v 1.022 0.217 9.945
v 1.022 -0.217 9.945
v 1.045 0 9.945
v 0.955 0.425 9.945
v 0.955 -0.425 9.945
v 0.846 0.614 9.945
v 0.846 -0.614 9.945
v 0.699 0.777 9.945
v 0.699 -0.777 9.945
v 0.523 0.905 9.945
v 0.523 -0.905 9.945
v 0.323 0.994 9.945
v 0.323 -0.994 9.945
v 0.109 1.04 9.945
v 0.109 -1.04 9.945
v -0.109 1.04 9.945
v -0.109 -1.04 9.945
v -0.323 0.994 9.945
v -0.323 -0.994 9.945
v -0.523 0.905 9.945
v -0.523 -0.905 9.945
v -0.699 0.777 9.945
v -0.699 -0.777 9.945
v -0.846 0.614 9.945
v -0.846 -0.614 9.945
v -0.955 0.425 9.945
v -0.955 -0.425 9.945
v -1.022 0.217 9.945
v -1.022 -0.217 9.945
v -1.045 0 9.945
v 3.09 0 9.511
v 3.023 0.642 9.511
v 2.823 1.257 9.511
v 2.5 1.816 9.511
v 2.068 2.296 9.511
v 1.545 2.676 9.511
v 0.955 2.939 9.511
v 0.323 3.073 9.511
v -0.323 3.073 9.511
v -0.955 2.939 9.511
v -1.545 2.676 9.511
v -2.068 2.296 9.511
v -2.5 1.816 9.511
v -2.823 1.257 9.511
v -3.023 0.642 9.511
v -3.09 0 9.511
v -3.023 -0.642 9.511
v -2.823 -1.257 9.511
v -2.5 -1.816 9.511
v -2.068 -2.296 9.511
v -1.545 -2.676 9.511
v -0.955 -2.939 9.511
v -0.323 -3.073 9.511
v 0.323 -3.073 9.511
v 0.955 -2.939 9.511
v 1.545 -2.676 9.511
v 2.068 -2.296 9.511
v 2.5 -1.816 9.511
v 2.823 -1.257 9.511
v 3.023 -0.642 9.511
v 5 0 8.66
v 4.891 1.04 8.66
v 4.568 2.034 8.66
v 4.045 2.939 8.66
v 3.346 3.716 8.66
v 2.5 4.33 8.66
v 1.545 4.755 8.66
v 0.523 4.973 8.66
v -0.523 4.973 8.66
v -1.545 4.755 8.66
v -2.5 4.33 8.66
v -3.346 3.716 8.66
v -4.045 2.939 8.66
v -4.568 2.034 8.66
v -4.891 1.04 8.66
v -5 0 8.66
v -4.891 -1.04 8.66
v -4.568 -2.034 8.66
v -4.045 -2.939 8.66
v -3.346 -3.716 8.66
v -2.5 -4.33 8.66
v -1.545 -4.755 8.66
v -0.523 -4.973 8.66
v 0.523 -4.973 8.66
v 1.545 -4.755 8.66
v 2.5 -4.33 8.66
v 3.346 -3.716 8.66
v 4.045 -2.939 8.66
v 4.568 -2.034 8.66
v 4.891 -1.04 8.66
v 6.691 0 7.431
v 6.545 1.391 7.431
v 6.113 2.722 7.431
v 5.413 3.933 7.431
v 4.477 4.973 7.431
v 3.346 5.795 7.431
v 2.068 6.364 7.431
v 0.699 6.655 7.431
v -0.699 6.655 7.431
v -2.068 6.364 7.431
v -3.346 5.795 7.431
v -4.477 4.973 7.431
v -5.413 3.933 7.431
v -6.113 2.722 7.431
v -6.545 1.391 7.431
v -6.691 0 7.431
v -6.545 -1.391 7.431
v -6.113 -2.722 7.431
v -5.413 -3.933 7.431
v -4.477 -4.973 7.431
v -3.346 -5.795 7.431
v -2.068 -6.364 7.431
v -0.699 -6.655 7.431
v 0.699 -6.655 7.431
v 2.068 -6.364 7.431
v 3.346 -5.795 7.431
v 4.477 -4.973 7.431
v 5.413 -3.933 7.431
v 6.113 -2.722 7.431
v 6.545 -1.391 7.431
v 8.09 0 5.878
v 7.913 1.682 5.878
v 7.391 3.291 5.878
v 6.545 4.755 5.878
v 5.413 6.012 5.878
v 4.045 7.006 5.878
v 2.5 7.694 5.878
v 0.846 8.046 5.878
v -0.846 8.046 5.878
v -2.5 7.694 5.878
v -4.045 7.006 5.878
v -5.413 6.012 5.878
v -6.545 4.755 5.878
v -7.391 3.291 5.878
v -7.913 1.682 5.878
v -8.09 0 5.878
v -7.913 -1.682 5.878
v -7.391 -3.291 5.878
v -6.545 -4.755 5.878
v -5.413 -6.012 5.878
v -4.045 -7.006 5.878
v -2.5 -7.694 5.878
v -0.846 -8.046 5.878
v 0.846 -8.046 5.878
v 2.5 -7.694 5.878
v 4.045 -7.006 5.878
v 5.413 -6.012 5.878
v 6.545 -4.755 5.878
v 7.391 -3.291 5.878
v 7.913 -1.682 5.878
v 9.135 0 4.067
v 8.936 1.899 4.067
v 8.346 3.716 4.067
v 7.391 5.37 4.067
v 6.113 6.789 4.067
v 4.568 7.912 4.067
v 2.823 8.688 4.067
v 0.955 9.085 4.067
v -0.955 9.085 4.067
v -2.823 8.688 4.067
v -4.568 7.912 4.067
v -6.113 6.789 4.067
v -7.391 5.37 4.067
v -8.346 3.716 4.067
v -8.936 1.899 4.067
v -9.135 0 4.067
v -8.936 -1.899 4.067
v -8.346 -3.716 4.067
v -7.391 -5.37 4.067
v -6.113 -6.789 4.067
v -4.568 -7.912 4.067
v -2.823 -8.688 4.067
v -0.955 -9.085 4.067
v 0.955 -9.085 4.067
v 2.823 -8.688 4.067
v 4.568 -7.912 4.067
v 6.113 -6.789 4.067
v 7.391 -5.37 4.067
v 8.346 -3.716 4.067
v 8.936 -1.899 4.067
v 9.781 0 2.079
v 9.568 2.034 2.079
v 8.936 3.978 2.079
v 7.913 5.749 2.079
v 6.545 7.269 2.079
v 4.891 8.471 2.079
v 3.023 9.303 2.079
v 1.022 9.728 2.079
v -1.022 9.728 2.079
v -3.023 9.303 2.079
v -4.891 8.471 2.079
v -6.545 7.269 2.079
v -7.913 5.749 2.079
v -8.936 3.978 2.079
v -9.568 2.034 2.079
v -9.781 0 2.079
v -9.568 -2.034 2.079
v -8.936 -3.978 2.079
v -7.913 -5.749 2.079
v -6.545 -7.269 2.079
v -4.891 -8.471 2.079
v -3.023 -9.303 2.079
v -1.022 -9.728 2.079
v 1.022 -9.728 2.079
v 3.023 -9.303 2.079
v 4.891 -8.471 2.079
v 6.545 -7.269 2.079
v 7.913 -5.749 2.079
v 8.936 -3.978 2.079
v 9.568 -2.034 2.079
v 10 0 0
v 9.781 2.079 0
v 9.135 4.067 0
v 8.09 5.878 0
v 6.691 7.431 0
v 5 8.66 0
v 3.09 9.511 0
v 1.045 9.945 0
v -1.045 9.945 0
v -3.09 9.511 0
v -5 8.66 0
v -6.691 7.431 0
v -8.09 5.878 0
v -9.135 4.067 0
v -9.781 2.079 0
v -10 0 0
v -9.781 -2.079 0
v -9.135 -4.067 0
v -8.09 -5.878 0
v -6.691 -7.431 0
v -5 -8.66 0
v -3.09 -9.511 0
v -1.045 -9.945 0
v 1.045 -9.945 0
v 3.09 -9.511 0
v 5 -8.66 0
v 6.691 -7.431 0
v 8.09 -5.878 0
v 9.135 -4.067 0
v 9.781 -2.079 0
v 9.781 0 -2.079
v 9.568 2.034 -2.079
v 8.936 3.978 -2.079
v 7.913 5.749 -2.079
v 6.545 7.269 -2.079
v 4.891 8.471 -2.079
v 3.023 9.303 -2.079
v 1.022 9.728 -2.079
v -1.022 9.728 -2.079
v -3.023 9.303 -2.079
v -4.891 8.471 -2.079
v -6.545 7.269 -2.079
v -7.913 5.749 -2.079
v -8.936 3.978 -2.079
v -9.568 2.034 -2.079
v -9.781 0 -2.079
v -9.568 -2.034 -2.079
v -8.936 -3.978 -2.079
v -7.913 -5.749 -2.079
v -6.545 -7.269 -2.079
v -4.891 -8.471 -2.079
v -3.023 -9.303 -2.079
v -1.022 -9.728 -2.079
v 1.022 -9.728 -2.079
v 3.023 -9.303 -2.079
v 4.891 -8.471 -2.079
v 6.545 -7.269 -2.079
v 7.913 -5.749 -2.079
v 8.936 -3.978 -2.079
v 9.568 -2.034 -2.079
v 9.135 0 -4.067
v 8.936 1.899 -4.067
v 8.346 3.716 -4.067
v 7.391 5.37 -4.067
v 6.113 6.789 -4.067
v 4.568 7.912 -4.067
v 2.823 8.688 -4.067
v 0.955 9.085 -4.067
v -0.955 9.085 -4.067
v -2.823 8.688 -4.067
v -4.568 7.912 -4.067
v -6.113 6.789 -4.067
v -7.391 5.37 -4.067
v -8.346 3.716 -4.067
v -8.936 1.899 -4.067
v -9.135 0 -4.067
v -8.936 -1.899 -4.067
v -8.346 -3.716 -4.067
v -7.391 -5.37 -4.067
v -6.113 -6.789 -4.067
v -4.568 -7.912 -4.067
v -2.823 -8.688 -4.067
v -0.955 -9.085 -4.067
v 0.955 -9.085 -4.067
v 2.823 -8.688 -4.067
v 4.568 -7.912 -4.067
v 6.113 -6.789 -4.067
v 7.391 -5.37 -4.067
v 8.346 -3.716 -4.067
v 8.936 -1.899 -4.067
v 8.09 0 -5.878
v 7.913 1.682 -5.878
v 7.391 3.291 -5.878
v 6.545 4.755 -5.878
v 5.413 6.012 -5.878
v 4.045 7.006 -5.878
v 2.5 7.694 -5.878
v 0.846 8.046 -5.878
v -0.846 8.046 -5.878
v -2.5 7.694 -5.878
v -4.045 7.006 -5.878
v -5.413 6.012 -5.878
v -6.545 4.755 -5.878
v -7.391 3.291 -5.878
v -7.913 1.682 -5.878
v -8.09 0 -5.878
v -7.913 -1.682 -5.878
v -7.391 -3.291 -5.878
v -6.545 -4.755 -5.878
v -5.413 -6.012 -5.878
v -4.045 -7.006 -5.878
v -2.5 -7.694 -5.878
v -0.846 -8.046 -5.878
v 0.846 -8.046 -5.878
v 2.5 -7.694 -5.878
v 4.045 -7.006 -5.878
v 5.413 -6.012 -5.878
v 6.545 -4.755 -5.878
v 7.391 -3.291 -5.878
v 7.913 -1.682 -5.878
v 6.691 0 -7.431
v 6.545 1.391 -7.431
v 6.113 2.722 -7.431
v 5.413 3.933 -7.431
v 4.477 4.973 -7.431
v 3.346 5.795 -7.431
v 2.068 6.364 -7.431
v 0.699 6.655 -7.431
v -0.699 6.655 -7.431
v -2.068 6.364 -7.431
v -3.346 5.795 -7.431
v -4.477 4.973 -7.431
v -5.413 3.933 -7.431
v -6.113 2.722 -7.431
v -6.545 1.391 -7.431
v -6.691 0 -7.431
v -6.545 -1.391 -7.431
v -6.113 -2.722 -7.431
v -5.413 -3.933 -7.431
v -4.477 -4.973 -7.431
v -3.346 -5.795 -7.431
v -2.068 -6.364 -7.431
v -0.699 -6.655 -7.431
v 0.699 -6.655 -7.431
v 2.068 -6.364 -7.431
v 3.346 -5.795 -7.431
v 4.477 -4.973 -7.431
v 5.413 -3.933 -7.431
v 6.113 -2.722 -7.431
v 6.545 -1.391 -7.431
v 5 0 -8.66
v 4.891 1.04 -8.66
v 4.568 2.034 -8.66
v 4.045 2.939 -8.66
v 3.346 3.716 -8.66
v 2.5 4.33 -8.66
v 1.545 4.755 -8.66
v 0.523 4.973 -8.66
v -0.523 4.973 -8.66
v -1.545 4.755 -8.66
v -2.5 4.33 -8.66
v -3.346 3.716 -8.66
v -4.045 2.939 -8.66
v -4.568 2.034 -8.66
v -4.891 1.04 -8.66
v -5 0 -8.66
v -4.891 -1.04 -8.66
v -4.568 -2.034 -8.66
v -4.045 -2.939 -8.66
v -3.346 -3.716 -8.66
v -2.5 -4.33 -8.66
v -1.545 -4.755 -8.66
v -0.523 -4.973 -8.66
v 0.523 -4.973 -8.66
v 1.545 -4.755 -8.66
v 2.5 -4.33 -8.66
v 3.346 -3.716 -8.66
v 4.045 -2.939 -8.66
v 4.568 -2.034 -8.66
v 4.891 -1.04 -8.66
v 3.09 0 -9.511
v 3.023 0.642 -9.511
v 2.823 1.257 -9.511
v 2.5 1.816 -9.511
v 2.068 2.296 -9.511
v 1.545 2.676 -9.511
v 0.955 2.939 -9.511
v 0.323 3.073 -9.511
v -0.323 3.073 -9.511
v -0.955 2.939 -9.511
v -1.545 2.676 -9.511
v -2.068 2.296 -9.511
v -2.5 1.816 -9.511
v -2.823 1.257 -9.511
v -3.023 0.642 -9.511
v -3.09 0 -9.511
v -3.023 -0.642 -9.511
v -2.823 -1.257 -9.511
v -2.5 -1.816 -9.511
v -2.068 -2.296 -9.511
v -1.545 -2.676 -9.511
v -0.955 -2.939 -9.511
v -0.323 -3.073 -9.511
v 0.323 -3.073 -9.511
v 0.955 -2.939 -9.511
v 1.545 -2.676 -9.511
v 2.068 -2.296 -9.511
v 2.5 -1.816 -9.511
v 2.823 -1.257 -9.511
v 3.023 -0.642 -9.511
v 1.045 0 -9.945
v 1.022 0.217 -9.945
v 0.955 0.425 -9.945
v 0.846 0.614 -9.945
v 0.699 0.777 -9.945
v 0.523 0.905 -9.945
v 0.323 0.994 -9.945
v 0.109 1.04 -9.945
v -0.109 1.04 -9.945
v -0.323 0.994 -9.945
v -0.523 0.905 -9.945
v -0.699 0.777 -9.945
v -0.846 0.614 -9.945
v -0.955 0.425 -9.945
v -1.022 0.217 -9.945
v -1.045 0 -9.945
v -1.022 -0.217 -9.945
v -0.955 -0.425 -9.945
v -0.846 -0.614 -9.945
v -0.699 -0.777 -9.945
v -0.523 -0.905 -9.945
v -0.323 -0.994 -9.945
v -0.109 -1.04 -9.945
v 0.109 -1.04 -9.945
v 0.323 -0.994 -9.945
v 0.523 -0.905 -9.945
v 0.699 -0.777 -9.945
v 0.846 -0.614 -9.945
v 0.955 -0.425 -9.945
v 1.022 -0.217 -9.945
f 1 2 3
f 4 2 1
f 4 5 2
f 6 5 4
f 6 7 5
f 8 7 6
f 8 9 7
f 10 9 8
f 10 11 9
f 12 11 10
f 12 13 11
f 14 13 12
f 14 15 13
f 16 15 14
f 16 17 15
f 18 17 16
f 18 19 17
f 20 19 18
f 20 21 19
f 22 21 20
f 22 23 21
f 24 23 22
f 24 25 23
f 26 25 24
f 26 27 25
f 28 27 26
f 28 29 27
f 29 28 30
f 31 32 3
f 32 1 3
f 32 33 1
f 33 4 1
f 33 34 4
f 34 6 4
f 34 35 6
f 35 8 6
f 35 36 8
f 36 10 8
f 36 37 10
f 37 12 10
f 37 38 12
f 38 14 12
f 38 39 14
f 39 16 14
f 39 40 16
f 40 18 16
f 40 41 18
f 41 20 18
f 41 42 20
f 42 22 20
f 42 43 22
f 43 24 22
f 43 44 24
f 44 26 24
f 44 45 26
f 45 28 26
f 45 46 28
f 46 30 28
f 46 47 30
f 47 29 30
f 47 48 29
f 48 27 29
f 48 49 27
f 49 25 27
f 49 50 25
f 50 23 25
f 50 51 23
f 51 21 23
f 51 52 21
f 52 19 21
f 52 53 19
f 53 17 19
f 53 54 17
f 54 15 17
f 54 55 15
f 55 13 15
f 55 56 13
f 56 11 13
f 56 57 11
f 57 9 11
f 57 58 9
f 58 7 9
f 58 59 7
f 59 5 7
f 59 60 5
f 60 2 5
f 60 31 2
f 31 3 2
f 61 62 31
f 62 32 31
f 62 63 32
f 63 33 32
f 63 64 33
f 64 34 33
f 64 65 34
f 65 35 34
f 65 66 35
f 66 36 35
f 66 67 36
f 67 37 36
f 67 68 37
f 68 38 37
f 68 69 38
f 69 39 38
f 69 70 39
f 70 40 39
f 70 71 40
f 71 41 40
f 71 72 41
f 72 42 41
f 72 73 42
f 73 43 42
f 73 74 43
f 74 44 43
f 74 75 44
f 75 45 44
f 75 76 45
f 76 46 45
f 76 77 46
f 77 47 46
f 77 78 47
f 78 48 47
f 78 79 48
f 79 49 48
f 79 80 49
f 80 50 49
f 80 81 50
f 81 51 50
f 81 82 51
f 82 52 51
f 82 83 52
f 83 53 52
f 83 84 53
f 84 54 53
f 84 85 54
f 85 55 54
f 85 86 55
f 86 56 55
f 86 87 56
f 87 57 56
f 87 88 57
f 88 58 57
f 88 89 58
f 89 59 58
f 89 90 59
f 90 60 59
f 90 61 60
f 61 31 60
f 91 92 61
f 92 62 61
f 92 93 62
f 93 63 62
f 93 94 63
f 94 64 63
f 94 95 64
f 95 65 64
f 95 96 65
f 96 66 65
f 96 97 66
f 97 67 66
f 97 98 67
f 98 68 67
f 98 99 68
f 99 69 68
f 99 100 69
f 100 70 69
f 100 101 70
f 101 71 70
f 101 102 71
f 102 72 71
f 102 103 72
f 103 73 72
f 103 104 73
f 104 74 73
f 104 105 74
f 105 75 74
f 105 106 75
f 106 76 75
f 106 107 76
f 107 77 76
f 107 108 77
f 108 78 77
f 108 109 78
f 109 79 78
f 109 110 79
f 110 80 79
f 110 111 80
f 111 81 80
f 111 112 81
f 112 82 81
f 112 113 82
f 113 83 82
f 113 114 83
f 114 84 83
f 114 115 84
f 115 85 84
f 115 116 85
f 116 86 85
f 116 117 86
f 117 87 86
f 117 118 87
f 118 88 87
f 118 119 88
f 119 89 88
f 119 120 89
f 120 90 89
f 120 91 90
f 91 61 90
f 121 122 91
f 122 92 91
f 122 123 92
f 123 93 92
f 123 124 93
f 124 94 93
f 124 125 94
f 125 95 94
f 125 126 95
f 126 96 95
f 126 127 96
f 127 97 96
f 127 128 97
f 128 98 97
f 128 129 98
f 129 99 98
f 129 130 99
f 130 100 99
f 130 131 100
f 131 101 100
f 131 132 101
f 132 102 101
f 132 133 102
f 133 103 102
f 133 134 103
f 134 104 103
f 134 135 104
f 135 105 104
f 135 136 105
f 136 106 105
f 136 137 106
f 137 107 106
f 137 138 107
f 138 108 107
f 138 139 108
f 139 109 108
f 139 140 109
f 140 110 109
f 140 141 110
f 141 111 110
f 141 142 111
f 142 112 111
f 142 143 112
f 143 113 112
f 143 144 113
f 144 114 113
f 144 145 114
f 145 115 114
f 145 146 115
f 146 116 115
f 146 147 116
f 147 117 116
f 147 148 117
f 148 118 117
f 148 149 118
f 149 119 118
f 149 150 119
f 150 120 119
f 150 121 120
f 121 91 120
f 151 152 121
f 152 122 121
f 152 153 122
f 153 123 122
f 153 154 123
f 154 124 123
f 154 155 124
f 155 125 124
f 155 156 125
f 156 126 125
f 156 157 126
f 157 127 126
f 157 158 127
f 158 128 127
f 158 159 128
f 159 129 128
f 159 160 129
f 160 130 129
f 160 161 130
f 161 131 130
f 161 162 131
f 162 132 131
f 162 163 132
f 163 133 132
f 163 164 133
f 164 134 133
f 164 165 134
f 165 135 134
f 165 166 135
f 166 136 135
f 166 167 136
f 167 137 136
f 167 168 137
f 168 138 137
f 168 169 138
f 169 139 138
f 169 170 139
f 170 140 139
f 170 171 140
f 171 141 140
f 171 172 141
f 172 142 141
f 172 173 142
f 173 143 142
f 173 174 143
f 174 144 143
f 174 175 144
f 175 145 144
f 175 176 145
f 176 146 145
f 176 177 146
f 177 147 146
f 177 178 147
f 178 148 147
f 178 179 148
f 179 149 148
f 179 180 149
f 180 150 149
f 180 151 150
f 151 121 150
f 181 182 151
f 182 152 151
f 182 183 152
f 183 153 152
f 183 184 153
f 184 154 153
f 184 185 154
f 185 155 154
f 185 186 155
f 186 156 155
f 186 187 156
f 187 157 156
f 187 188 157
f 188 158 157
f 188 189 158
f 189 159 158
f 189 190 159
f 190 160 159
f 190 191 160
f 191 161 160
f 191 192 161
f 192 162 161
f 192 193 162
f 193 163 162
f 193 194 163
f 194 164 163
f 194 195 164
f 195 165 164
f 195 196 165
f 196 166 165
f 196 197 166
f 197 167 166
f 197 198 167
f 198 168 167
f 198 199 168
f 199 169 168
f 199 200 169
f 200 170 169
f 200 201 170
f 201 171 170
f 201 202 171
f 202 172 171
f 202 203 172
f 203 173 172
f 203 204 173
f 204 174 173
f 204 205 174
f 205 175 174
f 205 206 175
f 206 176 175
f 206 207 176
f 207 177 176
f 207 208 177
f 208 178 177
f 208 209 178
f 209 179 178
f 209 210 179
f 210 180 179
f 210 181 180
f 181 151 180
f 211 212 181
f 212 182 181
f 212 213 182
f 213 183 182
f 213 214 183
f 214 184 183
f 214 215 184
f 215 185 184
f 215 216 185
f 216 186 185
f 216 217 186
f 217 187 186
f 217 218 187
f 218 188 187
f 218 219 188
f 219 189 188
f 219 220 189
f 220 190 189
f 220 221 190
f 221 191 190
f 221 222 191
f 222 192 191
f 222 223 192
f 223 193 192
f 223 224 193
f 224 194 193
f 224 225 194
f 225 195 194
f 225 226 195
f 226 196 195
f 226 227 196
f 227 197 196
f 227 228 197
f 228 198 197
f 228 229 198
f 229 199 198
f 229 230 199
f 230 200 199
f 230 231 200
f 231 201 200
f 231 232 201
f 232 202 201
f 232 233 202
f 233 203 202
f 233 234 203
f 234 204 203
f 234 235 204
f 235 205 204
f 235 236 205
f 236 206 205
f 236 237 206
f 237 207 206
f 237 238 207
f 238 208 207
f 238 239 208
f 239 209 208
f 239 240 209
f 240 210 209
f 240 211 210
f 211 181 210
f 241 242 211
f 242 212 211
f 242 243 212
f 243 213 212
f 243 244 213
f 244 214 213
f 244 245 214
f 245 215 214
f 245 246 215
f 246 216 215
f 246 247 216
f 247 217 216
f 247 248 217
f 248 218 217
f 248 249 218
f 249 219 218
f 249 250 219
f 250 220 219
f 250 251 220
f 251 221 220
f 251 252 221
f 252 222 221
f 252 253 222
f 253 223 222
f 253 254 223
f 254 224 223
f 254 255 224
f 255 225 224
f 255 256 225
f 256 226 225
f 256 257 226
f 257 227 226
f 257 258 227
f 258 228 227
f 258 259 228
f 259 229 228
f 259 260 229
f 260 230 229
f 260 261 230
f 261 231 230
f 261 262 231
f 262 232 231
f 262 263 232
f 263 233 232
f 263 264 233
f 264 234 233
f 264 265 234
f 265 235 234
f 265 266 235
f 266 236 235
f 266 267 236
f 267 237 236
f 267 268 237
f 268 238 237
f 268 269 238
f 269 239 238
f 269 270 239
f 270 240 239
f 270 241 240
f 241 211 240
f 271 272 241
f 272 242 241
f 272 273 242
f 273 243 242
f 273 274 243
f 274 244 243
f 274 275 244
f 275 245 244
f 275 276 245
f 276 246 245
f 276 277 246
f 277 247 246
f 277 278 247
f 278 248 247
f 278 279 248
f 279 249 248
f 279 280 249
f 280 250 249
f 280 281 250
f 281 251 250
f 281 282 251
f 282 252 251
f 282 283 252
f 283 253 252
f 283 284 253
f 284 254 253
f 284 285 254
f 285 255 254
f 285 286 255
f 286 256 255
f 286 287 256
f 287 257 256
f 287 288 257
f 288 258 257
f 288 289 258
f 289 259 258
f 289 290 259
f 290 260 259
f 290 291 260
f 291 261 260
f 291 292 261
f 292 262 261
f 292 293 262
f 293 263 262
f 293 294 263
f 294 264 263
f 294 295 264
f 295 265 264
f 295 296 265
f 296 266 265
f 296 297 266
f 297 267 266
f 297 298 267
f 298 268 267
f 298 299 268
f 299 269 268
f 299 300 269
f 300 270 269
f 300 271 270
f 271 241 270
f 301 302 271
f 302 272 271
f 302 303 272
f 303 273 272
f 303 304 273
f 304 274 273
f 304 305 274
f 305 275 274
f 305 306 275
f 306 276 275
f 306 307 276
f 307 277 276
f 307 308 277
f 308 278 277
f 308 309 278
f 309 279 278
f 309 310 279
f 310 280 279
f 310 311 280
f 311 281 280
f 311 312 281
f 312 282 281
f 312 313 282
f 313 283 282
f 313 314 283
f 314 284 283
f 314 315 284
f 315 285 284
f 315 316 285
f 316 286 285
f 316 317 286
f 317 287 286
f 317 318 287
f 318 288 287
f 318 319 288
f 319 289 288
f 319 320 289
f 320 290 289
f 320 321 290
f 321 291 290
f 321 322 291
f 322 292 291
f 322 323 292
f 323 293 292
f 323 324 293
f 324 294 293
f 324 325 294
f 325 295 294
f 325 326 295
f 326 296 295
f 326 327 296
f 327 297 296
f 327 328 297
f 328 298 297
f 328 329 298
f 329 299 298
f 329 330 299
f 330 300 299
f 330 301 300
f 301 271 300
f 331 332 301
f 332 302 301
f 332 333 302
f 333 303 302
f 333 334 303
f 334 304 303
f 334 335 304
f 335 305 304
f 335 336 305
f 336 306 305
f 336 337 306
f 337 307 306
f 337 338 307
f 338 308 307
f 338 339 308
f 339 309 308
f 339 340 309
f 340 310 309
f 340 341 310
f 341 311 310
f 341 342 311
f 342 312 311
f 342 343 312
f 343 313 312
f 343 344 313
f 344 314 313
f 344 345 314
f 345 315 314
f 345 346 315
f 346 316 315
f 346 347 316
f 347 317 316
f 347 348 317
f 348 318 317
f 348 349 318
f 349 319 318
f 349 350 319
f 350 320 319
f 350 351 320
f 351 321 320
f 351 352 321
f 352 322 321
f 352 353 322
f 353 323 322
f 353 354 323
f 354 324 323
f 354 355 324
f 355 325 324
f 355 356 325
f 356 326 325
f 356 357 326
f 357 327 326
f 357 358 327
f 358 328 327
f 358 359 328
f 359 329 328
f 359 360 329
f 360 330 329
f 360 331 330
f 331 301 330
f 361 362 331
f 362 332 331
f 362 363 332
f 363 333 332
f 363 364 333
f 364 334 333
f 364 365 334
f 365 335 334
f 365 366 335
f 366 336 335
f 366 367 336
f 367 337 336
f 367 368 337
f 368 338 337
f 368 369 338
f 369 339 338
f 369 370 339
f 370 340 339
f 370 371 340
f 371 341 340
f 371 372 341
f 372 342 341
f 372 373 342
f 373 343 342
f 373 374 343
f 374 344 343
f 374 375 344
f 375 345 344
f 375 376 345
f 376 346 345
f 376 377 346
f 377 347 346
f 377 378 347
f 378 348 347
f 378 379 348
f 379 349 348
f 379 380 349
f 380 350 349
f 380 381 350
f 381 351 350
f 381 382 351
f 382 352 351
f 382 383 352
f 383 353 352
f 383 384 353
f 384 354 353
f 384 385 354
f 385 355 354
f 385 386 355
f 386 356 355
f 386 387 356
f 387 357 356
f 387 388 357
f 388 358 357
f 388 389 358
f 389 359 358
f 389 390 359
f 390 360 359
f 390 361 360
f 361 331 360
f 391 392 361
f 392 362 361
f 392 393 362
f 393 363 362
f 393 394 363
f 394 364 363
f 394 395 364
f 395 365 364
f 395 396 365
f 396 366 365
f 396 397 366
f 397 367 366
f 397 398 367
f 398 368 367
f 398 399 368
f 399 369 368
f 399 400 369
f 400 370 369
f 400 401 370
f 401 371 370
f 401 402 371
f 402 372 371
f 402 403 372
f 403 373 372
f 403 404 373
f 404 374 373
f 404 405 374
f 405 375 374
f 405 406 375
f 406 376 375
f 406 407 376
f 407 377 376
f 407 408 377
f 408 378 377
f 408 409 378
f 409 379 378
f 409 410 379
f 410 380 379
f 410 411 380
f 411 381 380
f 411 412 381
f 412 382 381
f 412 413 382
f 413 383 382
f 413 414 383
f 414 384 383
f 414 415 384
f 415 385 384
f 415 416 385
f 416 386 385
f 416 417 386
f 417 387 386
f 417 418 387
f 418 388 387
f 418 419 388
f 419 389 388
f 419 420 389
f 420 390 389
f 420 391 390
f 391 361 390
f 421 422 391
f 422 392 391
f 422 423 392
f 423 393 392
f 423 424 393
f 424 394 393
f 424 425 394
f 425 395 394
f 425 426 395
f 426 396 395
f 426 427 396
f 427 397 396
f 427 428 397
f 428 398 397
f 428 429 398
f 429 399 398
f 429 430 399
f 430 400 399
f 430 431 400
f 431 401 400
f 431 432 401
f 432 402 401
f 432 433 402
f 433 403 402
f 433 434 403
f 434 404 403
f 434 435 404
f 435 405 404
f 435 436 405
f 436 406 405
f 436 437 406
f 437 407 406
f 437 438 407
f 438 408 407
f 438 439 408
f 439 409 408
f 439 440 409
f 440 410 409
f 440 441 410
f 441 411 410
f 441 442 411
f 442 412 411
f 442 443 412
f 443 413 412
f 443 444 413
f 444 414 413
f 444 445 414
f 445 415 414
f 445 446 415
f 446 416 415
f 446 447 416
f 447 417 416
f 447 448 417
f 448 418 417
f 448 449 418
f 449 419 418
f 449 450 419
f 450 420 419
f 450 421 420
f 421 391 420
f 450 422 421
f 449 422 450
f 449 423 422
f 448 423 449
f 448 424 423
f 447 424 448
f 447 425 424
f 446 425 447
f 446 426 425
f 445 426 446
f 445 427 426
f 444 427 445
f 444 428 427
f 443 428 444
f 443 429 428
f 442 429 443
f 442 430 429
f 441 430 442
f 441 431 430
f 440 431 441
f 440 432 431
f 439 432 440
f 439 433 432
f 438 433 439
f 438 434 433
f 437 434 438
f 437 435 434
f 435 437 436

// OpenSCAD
// Unit of length: Unit.MM
color()
{
   sphere(d = 20.0);
}
